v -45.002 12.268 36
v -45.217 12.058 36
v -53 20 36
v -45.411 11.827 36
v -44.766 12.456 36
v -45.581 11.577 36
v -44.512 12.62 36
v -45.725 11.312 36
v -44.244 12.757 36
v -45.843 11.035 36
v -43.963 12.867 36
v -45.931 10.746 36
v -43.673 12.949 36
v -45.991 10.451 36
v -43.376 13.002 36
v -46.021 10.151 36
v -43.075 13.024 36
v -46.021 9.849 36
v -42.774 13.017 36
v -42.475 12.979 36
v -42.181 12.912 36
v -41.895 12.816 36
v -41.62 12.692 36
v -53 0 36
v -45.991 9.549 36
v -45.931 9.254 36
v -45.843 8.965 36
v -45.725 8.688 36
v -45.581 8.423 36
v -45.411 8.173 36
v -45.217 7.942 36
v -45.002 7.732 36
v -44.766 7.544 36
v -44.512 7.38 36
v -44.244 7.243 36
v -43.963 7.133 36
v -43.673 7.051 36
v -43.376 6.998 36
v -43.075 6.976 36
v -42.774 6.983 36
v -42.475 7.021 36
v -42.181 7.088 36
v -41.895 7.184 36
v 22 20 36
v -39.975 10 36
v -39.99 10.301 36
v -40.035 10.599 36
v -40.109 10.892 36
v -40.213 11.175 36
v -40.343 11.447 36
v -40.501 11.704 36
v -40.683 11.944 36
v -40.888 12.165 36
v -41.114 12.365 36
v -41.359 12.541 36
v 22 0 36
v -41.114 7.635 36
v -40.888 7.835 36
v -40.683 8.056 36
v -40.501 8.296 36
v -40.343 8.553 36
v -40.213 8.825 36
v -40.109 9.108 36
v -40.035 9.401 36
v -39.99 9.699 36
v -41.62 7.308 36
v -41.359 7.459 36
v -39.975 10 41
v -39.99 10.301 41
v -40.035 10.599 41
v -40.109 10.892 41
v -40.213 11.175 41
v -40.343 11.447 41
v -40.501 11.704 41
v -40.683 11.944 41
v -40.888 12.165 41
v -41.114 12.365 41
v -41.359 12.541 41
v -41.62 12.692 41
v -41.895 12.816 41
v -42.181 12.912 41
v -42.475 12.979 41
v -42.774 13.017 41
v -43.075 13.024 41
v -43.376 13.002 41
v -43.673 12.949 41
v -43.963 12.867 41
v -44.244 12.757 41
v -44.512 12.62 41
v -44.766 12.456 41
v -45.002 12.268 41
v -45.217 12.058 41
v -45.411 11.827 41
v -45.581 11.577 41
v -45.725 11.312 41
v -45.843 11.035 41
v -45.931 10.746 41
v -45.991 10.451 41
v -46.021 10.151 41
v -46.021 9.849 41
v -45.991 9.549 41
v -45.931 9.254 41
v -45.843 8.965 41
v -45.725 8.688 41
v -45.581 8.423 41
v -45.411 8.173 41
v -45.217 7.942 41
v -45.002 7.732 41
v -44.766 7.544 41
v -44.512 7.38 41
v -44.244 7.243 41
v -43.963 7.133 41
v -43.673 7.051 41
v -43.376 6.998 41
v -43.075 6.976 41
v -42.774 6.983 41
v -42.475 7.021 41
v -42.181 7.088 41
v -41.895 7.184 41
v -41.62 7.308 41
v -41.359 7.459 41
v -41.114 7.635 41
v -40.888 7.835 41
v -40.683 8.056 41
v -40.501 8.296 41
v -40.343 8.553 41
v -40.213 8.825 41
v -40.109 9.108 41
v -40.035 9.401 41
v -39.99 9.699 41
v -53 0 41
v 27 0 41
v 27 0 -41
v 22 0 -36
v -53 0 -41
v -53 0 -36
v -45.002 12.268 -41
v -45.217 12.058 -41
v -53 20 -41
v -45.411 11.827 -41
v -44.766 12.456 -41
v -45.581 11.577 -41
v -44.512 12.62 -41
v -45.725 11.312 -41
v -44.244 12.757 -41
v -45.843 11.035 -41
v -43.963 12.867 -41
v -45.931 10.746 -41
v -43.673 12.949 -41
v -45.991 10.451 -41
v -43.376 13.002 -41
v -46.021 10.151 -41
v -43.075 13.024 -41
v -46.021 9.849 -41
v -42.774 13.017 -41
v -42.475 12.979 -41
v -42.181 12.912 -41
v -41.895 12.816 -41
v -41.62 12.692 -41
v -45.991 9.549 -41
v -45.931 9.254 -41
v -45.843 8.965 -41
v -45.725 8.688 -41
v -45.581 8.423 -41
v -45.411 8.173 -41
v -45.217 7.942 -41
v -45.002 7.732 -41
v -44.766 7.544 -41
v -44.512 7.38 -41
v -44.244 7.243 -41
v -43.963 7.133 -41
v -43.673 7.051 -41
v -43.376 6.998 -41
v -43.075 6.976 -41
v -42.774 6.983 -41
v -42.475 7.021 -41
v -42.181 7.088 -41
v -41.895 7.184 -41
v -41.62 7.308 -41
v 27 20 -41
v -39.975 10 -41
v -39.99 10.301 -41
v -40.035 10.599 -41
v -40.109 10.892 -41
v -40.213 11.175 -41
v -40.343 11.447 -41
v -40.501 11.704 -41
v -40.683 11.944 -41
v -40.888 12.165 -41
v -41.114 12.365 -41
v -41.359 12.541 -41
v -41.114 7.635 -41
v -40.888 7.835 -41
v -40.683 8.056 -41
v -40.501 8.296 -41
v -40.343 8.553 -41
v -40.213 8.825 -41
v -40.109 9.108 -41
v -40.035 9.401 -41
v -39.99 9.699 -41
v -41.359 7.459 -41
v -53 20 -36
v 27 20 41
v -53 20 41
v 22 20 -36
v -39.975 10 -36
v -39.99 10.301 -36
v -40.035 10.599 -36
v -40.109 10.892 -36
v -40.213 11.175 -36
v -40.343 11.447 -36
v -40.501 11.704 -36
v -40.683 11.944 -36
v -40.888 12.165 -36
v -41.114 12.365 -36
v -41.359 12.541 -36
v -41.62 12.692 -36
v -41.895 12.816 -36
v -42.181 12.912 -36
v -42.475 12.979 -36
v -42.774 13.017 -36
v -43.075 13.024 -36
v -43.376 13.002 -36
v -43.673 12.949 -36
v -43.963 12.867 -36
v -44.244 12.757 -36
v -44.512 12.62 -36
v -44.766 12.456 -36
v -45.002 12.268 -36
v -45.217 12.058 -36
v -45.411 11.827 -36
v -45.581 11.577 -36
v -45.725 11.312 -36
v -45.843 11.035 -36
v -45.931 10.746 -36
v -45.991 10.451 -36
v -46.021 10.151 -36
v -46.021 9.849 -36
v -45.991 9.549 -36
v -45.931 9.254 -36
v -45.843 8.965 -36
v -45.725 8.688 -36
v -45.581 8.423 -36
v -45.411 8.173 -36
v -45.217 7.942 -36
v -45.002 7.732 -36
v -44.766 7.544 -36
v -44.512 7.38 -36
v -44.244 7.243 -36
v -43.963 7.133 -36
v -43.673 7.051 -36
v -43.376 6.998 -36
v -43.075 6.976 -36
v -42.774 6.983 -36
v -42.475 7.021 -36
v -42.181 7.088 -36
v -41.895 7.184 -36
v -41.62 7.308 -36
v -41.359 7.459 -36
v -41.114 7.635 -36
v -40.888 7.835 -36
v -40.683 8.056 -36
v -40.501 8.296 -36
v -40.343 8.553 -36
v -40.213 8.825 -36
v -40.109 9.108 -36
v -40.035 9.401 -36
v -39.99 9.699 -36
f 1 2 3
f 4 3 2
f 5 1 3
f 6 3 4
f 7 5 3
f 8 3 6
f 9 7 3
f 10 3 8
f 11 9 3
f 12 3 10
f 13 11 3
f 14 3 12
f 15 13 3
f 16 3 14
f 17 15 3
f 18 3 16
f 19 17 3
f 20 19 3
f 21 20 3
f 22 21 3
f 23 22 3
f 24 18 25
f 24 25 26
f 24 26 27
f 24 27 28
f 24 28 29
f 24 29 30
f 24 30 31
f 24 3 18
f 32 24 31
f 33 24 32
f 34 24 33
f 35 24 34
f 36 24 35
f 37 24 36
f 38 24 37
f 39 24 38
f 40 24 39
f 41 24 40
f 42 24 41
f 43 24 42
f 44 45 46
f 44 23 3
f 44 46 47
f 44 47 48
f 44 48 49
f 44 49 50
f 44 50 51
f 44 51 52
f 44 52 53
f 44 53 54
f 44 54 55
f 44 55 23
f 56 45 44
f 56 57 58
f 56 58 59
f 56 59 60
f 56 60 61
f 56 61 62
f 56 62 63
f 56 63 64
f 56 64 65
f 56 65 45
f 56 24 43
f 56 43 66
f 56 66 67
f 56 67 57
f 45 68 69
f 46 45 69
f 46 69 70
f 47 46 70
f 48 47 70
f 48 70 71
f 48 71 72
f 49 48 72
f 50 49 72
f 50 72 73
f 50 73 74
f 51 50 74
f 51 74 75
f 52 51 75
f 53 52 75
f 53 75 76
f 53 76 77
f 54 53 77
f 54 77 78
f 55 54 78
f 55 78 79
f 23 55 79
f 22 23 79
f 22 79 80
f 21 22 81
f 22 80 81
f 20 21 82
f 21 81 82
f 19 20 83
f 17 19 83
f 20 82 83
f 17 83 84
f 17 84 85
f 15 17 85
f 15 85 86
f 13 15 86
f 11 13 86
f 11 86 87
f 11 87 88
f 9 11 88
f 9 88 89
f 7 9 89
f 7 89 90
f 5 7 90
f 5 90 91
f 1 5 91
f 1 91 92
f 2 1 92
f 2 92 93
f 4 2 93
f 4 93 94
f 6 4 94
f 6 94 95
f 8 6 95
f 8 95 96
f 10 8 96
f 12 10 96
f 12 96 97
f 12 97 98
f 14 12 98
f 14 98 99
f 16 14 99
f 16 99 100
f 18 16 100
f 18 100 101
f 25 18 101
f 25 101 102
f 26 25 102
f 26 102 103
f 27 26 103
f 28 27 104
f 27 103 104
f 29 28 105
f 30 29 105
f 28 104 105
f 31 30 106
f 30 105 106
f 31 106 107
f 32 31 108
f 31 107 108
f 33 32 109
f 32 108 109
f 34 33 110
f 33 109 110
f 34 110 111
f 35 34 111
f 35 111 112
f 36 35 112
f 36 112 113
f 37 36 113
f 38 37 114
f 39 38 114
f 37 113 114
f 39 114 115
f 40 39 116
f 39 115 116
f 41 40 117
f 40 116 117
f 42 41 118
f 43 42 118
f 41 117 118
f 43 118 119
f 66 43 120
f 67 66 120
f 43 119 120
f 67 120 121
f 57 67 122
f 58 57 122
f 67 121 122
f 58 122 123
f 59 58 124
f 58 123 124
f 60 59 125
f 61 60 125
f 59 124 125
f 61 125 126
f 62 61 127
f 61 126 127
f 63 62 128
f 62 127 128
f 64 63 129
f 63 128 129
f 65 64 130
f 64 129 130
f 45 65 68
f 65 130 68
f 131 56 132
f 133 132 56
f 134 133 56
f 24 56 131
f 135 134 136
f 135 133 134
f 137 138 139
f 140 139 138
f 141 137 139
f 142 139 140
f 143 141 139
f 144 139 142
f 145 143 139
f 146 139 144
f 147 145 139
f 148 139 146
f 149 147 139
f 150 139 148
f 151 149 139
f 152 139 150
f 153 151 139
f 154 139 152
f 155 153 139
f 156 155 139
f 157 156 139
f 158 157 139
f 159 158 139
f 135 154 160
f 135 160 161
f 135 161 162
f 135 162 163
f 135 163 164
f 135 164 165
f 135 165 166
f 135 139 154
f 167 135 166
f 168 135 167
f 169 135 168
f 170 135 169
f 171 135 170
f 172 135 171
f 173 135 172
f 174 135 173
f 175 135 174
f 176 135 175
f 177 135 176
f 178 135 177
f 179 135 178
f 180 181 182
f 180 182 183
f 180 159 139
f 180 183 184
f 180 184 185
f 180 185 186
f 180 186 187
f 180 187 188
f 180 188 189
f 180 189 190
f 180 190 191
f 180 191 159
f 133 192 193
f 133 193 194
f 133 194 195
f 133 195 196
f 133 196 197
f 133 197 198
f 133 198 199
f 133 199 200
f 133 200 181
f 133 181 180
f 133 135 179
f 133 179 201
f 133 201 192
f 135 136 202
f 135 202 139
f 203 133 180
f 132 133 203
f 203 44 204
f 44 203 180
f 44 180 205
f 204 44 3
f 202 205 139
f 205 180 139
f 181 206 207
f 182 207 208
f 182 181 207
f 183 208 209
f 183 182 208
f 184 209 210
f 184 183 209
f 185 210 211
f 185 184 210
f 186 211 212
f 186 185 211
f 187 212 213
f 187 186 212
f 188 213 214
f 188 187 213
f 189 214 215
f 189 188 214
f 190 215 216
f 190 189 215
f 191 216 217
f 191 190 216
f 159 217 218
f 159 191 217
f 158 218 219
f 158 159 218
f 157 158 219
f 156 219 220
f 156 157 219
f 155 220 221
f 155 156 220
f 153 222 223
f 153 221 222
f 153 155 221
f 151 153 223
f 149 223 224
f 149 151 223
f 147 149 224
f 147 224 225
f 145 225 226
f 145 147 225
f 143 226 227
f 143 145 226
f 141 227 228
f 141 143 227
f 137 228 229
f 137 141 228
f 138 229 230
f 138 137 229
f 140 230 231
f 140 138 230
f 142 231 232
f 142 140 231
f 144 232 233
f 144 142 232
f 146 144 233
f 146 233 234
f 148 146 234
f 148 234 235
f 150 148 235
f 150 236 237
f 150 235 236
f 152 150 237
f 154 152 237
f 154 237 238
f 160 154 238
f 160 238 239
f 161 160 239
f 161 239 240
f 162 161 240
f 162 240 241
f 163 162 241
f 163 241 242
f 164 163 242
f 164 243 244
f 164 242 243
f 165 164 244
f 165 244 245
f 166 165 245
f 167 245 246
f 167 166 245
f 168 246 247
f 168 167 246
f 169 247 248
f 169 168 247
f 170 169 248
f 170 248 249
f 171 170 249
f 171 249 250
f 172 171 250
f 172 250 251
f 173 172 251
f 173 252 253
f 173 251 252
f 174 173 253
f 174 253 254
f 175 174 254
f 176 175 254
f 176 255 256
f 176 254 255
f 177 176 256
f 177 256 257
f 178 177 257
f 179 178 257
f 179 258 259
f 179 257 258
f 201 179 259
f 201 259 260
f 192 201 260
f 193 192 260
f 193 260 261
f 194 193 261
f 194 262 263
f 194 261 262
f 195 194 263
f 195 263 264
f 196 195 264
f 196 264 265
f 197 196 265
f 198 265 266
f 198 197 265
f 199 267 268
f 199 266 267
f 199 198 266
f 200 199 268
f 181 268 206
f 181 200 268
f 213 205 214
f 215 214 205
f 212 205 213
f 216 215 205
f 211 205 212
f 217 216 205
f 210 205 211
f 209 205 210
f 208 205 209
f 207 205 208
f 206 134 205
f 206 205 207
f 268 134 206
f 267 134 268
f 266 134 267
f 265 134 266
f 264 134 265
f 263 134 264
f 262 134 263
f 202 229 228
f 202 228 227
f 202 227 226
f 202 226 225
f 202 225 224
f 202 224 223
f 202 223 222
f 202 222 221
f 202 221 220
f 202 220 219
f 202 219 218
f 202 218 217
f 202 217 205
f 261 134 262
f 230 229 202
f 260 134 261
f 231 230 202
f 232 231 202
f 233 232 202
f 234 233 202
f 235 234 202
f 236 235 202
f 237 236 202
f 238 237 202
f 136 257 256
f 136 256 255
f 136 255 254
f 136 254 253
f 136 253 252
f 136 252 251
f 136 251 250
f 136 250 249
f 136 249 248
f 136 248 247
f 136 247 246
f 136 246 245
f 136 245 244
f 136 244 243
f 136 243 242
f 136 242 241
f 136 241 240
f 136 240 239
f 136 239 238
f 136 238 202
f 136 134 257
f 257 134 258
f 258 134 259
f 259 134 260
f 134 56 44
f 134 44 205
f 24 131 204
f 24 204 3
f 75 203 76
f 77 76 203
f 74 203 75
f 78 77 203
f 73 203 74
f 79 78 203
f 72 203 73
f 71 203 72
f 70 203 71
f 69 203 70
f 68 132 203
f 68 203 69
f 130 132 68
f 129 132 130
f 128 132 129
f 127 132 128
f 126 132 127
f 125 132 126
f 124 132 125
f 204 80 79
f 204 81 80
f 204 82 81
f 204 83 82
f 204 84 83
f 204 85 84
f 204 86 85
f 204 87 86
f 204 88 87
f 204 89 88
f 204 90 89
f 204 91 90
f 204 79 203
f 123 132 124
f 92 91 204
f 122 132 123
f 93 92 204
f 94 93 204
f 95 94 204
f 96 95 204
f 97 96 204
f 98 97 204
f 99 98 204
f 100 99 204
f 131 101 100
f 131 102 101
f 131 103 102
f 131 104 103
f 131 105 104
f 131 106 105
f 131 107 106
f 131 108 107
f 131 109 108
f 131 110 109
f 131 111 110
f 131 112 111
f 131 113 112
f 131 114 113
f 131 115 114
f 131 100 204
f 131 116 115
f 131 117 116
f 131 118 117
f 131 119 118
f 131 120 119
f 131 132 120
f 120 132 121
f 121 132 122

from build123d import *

# Parameters (mm, degrees)
BOSS_EXTRUDE1_DEPTH = 20
SKETCH3_R           = 3.025
CUT_EXTRUDE1_DEPTH  = 77


with BuildPart() as part:
    # Sketch2 → Boss-Extrude1 (new body)
    with BuildSketch(Plane(origin=(0, 0, 0), x_dir=(1, 0, 0), z_dir=(0, 1, 0))):
        Polygon((-53, 41), (27, 41), (27, -41), (-53, -41), (-53, -36), (22, -36), (22, 36), (-53, 36), align=None)
    extrude(amount=BOSS_EXTRUDE1_DEPTH)

    # Sketch3 → Cut-Extrude1 (cut)
    with BuildSketch(Plane.XY.offset(41)):
        with Locations((-43, 10)):
            Circle(SKETCH3_R)
    cut_extrude1 = extrude(amount=-CUT_EXTRUDE1_DEPTH, mode=Mode.SUBTRACT)

    # Mirror1: Cut-Extrude1 across plane
    add(cut_extrude1.mirror(Plane.XY), mode=Mode.SUBTRACT)


solid = part.part
